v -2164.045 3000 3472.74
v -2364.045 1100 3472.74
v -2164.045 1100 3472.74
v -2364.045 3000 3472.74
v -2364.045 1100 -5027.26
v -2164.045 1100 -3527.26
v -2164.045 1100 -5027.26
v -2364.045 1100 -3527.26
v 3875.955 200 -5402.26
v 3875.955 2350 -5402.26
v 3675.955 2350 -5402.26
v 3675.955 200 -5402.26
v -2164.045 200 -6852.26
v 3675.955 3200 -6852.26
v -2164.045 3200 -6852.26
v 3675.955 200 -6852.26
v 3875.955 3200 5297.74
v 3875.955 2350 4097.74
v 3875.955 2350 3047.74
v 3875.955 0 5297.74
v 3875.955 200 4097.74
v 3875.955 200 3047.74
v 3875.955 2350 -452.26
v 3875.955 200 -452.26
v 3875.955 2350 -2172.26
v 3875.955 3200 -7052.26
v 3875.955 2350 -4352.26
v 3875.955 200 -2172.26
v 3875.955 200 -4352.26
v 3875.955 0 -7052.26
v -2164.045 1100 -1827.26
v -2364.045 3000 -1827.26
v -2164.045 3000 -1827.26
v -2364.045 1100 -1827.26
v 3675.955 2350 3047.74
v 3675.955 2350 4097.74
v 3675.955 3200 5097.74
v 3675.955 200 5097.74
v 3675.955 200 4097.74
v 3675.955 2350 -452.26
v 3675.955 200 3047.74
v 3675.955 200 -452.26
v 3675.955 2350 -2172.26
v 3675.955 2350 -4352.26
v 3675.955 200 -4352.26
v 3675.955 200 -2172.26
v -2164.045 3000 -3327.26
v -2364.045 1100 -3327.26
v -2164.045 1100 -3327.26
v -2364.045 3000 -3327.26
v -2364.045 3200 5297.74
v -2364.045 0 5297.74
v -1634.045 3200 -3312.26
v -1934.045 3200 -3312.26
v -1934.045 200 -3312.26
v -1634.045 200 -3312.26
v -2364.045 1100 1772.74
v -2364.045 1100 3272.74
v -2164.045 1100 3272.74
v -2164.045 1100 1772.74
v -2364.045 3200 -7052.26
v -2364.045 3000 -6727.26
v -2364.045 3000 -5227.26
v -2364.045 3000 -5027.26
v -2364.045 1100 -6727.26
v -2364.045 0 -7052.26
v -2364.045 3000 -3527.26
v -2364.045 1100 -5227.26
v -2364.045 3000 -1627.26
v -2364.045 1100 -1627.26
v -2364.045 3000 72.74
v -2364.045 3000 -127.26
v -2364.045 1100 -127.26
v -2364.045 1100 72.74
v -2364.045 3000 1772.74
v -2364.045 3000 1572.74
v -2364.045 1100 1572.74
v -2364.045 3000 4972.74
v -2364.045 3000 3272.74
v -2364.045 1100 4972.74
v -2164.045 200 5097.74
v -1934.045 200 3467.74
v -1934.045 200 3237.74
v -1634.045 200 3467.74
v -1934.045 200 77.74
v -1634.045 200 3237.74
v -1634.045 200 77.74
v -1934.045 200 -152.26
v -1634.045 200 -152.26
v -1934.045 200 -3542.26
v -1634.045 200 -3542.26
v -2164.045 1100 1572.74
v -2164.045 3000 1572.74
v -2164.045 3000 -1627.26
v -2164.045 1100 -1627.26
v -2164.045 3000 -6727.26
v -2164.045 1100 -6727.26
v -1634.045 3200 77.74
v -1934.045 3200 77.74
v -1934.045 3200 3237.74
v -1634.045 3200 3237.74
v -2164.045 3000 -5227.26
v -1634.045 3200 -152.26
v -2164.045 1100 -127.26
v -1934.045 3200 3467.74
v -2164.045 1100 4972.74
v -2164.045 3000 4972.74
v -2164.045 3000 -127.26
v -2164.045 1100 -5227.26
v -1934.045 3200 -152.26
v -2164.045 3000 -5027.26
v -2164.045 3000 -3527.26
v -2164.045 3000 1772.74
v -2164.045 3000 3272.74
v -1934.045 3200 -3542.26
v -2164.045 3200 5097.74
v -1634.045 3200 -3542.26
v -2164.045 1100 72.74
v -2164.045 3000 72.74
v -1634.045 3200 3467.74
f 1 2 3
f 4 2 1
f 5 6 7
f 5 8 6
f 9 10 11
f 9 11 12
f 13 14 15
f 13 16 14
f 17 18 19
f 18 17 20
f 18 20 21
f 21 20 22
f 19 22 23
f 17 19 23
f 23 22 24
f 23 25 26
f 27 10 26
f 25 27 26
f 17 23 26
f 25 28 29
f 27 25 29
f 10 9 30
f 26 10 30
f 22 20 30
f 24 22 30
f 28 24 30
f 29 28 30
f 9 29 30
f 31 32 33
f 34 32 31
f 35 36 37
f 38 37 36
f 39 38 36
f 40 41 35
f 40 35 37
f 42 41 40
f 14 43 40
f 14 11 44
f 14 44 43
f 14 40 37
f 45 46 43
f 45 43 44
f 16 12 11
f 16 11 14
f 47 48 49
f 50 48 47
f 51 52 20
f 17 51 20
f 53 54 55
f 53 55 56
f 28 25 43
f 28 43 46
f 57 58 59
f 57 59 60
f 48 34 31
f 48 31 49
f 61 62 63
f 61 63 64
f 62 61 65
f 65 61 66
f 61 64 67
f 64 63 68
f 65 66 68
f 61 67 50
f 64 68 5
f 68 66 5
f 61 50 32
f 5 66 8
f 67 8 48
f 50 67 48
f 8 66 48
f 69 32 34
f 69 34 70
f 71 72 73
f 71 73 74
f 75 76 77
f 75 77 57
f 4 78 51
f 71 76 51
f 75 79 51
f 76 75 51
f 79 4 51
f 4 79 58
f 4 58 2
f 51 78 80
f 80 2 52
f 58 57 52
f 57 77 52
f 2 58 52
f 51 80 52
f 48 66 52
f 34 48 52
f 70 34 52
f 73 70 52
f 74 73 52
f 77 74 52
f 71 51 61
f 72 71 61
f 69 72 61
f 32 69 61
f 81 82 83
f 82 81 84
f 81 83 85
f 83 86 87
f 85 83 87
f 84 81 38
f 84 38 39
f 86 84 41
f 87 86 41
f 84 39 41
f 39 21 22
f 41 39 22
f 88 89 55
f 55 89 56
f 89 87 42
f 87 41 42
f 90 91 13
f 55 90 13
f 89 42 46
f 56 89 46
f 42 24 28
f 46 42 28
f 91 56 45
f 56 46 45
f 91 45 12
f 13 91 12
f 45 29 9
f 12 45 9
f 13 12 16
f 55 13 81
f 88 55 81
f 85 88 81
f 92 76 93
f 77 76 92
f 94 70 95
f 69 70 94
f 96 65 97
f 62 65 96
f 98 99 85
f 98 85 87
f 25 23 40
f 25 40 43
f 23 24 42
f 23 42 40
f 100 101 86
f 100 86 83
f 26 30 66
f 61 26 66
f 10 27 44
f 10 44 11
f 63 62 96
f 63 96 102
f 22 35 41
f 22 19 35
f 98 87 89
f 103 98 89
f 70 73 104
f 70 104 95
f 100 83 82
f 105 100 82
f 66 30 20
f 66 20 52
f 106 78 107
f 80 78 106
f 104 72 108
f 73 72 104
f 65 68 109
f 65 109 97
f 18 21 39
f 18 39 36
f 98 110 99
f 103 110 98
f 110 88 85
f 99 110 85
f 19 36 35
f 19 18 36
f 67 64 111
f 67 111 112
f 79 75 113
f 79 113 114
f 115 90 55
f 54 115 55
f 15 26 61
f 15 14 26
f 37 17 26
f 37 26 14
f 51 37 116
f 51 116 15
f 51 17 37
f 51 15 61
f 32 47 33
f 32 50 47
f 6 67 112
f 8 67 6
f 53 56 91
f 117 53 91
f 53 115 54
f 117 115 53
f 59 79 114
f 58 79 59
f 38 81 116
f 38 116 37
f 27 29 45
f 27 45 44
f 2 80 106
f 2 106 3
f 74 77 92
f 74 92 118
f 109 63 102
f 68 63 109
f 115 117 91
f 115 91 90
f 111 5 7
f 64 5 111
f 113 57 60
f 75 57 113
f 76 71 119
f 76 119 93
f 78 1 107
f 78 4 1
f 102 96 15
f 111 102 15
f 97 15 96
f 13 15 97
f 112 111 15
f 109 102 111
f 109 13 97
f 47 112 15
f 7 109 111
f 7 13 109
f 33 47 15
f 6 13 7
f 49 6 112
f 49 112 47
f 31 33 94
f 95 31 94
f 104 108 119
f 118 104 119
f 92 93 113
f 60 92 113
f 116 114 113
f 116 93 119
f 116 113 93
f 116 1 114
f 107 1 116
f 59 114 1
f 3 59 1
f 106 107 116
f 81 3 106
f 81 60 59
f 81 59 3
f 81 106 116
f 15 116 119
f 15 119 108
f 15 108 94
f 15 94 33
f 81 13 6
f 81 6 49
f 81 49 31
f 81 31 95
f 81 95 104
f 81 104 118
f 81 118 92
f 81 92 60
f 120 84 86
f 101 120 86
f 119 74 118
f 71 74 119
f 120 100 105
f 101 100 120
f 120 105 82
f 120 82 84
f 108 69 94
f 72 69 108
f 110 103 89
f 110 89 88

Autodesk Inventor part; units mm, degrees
ref_plane "YZ Plane" through (0, 0, 0) normal (1, 0, 0) x (0, 1, 0)
ref_plane "XZ Plane" through (0, 0, 0) normal (0, 1, 0) x (-1, 0, 0)
ref_plane "XY Plane" through (0, 0, 0) normal (0, 0, 1) x (1, 0, 0)
sketch "Esquisse1" plane through (0, 0, 0) normal (0, 1, 0) x (-1, 0, 0)
  line L0 (2364.0452, 5297.7399) -> (-3875.9548, 5297.7399)
  line L1 (-3875.9548, 5297.7399) -> (-3875.9548, -7052.2601)
  line L2 (-3875.9548, -7052.2601) -> (2364.0452, -7052.2601)
  line L3 (2364.0452, -7052.2601) -> (2364.0452, 5297.7399)
  point P0 (0, 0)
  dimension "d0" = 12350
  dimension "d1" = 6240
extrude "Extrusion1" add sketch "Esquisse1" along normal blind 3200
shell "Coque1" thickness 200 removed faces 1 at (-284.0452, 3200, 1181.0732)
sketch "Esquisse2" plane through (3875.9548, 0, 5297.7399) normal (1, 0, 0) x (0, 0, -1)
  line L0 (200, 200) -> (12150, 200) projected
  line L1 (5750, 2350) -> (7470, 2350)
  line L2 (7470, 2350) -> (7470, 200)
  line L3 (7470, 200) -> (5750, 200)
  line L4 (5750, 200) -> (5750, 2350)
  line L5 (9650, 2350) -> (10700, 2350)
  line L6 (10700, 2350) -> (10700, 200)
  line L7 (10700, 200) -> (9650, 200)
  line L8 (9650, 200) -> (9650, 2350)
  line L9 (12150, 200) -> (12150, 3200) projected
  line L10 (1200, 2350) -> (2250, 2350)
  line L11 (2250, 2350) -> (2250, 200)
  line L12 (2250, 200) -> (1200, 200)
  line L13 (1200, 200) -> (1200, 2350)
  line L14 (200, 200) -> (200, 3200) projected
  point P0 (5297.7399, 0)
  dimension "d5" = 1050
  dimension "d6" = 1450
  dimension "d7" = 2150
  dimension "d8" = 1720
  dimension "d10" = 4680
  dimension "d32" = 1050
  dimension "d33" = 1000
  dimension "d34" = 2150
extrude "Extrusion2" cut sketch "Esquisse2" against normal blind 3000
sketch "Esquisse3" plane through (-2364.0452, 0, -7052.2601) normal (-1, 0, 0) x (0, 0, 1)
  line L0 (325, 3000) -> (1825, 3000)
  line L1 (1825, 3000) -> (1825, 1100)
  line L2 (1825, 1100) -> (325, 1100)
  line L3 (325, 1100) -> (325, 3000)
  line L4 (200, 200) -> (12150, 200) projected
  line L5 (200, 200) -> (200, 3200) projected
  point P0 (7052.2601, 0)
  dimension "d13" = 900
  dimension "d14" = 1900
  dimension "d15" = 1500
  dimension "d16" = 125
extrude "Extrusion3" cut sketch "Esquisse3" against normal blind 3000
pattern_linear "Réseau rectangulaire1" count 7 spacing 1700 along (0, 0, 1) of "Extrusion3"
sketch "Esquisse4" plane through (-2164.0452, 200, -6852.2601) normal (0, 1, 0) x (1, 0, 0)
  line L0 (530, -3310) -> (230, -3310)
  line L1 (230, -3310) -> (230, -3540)
  line L2 (230, -3540) -> (530, -3540)
  line L3 (530, -3540) -> (530, -3310)
  line L4 (0, 0) -> (5840, 0) projected
  line L5 (0, -11950) -> (0, 0) projected
  point P0 (2164.0452, -6852.2601)
  dimension "d22" = 230
  dimension "d23" = 300
  dimension "d25" = 3540
  dimension "d26" = 230
extrude "Extrusion4" add sketch "Esquisse4" along normal blind 3000
pattern_linear "Réseau rectangulaire2" count 3 spacing 3390 along (0, 0, 1) of "Extrusion4"
sketch "Esquisse5" plane through (3875.9548, 0, 5297.7399) normal (1, 0, 0) x (0, 0, -1)
  point P0 (5297.7399, 0)
